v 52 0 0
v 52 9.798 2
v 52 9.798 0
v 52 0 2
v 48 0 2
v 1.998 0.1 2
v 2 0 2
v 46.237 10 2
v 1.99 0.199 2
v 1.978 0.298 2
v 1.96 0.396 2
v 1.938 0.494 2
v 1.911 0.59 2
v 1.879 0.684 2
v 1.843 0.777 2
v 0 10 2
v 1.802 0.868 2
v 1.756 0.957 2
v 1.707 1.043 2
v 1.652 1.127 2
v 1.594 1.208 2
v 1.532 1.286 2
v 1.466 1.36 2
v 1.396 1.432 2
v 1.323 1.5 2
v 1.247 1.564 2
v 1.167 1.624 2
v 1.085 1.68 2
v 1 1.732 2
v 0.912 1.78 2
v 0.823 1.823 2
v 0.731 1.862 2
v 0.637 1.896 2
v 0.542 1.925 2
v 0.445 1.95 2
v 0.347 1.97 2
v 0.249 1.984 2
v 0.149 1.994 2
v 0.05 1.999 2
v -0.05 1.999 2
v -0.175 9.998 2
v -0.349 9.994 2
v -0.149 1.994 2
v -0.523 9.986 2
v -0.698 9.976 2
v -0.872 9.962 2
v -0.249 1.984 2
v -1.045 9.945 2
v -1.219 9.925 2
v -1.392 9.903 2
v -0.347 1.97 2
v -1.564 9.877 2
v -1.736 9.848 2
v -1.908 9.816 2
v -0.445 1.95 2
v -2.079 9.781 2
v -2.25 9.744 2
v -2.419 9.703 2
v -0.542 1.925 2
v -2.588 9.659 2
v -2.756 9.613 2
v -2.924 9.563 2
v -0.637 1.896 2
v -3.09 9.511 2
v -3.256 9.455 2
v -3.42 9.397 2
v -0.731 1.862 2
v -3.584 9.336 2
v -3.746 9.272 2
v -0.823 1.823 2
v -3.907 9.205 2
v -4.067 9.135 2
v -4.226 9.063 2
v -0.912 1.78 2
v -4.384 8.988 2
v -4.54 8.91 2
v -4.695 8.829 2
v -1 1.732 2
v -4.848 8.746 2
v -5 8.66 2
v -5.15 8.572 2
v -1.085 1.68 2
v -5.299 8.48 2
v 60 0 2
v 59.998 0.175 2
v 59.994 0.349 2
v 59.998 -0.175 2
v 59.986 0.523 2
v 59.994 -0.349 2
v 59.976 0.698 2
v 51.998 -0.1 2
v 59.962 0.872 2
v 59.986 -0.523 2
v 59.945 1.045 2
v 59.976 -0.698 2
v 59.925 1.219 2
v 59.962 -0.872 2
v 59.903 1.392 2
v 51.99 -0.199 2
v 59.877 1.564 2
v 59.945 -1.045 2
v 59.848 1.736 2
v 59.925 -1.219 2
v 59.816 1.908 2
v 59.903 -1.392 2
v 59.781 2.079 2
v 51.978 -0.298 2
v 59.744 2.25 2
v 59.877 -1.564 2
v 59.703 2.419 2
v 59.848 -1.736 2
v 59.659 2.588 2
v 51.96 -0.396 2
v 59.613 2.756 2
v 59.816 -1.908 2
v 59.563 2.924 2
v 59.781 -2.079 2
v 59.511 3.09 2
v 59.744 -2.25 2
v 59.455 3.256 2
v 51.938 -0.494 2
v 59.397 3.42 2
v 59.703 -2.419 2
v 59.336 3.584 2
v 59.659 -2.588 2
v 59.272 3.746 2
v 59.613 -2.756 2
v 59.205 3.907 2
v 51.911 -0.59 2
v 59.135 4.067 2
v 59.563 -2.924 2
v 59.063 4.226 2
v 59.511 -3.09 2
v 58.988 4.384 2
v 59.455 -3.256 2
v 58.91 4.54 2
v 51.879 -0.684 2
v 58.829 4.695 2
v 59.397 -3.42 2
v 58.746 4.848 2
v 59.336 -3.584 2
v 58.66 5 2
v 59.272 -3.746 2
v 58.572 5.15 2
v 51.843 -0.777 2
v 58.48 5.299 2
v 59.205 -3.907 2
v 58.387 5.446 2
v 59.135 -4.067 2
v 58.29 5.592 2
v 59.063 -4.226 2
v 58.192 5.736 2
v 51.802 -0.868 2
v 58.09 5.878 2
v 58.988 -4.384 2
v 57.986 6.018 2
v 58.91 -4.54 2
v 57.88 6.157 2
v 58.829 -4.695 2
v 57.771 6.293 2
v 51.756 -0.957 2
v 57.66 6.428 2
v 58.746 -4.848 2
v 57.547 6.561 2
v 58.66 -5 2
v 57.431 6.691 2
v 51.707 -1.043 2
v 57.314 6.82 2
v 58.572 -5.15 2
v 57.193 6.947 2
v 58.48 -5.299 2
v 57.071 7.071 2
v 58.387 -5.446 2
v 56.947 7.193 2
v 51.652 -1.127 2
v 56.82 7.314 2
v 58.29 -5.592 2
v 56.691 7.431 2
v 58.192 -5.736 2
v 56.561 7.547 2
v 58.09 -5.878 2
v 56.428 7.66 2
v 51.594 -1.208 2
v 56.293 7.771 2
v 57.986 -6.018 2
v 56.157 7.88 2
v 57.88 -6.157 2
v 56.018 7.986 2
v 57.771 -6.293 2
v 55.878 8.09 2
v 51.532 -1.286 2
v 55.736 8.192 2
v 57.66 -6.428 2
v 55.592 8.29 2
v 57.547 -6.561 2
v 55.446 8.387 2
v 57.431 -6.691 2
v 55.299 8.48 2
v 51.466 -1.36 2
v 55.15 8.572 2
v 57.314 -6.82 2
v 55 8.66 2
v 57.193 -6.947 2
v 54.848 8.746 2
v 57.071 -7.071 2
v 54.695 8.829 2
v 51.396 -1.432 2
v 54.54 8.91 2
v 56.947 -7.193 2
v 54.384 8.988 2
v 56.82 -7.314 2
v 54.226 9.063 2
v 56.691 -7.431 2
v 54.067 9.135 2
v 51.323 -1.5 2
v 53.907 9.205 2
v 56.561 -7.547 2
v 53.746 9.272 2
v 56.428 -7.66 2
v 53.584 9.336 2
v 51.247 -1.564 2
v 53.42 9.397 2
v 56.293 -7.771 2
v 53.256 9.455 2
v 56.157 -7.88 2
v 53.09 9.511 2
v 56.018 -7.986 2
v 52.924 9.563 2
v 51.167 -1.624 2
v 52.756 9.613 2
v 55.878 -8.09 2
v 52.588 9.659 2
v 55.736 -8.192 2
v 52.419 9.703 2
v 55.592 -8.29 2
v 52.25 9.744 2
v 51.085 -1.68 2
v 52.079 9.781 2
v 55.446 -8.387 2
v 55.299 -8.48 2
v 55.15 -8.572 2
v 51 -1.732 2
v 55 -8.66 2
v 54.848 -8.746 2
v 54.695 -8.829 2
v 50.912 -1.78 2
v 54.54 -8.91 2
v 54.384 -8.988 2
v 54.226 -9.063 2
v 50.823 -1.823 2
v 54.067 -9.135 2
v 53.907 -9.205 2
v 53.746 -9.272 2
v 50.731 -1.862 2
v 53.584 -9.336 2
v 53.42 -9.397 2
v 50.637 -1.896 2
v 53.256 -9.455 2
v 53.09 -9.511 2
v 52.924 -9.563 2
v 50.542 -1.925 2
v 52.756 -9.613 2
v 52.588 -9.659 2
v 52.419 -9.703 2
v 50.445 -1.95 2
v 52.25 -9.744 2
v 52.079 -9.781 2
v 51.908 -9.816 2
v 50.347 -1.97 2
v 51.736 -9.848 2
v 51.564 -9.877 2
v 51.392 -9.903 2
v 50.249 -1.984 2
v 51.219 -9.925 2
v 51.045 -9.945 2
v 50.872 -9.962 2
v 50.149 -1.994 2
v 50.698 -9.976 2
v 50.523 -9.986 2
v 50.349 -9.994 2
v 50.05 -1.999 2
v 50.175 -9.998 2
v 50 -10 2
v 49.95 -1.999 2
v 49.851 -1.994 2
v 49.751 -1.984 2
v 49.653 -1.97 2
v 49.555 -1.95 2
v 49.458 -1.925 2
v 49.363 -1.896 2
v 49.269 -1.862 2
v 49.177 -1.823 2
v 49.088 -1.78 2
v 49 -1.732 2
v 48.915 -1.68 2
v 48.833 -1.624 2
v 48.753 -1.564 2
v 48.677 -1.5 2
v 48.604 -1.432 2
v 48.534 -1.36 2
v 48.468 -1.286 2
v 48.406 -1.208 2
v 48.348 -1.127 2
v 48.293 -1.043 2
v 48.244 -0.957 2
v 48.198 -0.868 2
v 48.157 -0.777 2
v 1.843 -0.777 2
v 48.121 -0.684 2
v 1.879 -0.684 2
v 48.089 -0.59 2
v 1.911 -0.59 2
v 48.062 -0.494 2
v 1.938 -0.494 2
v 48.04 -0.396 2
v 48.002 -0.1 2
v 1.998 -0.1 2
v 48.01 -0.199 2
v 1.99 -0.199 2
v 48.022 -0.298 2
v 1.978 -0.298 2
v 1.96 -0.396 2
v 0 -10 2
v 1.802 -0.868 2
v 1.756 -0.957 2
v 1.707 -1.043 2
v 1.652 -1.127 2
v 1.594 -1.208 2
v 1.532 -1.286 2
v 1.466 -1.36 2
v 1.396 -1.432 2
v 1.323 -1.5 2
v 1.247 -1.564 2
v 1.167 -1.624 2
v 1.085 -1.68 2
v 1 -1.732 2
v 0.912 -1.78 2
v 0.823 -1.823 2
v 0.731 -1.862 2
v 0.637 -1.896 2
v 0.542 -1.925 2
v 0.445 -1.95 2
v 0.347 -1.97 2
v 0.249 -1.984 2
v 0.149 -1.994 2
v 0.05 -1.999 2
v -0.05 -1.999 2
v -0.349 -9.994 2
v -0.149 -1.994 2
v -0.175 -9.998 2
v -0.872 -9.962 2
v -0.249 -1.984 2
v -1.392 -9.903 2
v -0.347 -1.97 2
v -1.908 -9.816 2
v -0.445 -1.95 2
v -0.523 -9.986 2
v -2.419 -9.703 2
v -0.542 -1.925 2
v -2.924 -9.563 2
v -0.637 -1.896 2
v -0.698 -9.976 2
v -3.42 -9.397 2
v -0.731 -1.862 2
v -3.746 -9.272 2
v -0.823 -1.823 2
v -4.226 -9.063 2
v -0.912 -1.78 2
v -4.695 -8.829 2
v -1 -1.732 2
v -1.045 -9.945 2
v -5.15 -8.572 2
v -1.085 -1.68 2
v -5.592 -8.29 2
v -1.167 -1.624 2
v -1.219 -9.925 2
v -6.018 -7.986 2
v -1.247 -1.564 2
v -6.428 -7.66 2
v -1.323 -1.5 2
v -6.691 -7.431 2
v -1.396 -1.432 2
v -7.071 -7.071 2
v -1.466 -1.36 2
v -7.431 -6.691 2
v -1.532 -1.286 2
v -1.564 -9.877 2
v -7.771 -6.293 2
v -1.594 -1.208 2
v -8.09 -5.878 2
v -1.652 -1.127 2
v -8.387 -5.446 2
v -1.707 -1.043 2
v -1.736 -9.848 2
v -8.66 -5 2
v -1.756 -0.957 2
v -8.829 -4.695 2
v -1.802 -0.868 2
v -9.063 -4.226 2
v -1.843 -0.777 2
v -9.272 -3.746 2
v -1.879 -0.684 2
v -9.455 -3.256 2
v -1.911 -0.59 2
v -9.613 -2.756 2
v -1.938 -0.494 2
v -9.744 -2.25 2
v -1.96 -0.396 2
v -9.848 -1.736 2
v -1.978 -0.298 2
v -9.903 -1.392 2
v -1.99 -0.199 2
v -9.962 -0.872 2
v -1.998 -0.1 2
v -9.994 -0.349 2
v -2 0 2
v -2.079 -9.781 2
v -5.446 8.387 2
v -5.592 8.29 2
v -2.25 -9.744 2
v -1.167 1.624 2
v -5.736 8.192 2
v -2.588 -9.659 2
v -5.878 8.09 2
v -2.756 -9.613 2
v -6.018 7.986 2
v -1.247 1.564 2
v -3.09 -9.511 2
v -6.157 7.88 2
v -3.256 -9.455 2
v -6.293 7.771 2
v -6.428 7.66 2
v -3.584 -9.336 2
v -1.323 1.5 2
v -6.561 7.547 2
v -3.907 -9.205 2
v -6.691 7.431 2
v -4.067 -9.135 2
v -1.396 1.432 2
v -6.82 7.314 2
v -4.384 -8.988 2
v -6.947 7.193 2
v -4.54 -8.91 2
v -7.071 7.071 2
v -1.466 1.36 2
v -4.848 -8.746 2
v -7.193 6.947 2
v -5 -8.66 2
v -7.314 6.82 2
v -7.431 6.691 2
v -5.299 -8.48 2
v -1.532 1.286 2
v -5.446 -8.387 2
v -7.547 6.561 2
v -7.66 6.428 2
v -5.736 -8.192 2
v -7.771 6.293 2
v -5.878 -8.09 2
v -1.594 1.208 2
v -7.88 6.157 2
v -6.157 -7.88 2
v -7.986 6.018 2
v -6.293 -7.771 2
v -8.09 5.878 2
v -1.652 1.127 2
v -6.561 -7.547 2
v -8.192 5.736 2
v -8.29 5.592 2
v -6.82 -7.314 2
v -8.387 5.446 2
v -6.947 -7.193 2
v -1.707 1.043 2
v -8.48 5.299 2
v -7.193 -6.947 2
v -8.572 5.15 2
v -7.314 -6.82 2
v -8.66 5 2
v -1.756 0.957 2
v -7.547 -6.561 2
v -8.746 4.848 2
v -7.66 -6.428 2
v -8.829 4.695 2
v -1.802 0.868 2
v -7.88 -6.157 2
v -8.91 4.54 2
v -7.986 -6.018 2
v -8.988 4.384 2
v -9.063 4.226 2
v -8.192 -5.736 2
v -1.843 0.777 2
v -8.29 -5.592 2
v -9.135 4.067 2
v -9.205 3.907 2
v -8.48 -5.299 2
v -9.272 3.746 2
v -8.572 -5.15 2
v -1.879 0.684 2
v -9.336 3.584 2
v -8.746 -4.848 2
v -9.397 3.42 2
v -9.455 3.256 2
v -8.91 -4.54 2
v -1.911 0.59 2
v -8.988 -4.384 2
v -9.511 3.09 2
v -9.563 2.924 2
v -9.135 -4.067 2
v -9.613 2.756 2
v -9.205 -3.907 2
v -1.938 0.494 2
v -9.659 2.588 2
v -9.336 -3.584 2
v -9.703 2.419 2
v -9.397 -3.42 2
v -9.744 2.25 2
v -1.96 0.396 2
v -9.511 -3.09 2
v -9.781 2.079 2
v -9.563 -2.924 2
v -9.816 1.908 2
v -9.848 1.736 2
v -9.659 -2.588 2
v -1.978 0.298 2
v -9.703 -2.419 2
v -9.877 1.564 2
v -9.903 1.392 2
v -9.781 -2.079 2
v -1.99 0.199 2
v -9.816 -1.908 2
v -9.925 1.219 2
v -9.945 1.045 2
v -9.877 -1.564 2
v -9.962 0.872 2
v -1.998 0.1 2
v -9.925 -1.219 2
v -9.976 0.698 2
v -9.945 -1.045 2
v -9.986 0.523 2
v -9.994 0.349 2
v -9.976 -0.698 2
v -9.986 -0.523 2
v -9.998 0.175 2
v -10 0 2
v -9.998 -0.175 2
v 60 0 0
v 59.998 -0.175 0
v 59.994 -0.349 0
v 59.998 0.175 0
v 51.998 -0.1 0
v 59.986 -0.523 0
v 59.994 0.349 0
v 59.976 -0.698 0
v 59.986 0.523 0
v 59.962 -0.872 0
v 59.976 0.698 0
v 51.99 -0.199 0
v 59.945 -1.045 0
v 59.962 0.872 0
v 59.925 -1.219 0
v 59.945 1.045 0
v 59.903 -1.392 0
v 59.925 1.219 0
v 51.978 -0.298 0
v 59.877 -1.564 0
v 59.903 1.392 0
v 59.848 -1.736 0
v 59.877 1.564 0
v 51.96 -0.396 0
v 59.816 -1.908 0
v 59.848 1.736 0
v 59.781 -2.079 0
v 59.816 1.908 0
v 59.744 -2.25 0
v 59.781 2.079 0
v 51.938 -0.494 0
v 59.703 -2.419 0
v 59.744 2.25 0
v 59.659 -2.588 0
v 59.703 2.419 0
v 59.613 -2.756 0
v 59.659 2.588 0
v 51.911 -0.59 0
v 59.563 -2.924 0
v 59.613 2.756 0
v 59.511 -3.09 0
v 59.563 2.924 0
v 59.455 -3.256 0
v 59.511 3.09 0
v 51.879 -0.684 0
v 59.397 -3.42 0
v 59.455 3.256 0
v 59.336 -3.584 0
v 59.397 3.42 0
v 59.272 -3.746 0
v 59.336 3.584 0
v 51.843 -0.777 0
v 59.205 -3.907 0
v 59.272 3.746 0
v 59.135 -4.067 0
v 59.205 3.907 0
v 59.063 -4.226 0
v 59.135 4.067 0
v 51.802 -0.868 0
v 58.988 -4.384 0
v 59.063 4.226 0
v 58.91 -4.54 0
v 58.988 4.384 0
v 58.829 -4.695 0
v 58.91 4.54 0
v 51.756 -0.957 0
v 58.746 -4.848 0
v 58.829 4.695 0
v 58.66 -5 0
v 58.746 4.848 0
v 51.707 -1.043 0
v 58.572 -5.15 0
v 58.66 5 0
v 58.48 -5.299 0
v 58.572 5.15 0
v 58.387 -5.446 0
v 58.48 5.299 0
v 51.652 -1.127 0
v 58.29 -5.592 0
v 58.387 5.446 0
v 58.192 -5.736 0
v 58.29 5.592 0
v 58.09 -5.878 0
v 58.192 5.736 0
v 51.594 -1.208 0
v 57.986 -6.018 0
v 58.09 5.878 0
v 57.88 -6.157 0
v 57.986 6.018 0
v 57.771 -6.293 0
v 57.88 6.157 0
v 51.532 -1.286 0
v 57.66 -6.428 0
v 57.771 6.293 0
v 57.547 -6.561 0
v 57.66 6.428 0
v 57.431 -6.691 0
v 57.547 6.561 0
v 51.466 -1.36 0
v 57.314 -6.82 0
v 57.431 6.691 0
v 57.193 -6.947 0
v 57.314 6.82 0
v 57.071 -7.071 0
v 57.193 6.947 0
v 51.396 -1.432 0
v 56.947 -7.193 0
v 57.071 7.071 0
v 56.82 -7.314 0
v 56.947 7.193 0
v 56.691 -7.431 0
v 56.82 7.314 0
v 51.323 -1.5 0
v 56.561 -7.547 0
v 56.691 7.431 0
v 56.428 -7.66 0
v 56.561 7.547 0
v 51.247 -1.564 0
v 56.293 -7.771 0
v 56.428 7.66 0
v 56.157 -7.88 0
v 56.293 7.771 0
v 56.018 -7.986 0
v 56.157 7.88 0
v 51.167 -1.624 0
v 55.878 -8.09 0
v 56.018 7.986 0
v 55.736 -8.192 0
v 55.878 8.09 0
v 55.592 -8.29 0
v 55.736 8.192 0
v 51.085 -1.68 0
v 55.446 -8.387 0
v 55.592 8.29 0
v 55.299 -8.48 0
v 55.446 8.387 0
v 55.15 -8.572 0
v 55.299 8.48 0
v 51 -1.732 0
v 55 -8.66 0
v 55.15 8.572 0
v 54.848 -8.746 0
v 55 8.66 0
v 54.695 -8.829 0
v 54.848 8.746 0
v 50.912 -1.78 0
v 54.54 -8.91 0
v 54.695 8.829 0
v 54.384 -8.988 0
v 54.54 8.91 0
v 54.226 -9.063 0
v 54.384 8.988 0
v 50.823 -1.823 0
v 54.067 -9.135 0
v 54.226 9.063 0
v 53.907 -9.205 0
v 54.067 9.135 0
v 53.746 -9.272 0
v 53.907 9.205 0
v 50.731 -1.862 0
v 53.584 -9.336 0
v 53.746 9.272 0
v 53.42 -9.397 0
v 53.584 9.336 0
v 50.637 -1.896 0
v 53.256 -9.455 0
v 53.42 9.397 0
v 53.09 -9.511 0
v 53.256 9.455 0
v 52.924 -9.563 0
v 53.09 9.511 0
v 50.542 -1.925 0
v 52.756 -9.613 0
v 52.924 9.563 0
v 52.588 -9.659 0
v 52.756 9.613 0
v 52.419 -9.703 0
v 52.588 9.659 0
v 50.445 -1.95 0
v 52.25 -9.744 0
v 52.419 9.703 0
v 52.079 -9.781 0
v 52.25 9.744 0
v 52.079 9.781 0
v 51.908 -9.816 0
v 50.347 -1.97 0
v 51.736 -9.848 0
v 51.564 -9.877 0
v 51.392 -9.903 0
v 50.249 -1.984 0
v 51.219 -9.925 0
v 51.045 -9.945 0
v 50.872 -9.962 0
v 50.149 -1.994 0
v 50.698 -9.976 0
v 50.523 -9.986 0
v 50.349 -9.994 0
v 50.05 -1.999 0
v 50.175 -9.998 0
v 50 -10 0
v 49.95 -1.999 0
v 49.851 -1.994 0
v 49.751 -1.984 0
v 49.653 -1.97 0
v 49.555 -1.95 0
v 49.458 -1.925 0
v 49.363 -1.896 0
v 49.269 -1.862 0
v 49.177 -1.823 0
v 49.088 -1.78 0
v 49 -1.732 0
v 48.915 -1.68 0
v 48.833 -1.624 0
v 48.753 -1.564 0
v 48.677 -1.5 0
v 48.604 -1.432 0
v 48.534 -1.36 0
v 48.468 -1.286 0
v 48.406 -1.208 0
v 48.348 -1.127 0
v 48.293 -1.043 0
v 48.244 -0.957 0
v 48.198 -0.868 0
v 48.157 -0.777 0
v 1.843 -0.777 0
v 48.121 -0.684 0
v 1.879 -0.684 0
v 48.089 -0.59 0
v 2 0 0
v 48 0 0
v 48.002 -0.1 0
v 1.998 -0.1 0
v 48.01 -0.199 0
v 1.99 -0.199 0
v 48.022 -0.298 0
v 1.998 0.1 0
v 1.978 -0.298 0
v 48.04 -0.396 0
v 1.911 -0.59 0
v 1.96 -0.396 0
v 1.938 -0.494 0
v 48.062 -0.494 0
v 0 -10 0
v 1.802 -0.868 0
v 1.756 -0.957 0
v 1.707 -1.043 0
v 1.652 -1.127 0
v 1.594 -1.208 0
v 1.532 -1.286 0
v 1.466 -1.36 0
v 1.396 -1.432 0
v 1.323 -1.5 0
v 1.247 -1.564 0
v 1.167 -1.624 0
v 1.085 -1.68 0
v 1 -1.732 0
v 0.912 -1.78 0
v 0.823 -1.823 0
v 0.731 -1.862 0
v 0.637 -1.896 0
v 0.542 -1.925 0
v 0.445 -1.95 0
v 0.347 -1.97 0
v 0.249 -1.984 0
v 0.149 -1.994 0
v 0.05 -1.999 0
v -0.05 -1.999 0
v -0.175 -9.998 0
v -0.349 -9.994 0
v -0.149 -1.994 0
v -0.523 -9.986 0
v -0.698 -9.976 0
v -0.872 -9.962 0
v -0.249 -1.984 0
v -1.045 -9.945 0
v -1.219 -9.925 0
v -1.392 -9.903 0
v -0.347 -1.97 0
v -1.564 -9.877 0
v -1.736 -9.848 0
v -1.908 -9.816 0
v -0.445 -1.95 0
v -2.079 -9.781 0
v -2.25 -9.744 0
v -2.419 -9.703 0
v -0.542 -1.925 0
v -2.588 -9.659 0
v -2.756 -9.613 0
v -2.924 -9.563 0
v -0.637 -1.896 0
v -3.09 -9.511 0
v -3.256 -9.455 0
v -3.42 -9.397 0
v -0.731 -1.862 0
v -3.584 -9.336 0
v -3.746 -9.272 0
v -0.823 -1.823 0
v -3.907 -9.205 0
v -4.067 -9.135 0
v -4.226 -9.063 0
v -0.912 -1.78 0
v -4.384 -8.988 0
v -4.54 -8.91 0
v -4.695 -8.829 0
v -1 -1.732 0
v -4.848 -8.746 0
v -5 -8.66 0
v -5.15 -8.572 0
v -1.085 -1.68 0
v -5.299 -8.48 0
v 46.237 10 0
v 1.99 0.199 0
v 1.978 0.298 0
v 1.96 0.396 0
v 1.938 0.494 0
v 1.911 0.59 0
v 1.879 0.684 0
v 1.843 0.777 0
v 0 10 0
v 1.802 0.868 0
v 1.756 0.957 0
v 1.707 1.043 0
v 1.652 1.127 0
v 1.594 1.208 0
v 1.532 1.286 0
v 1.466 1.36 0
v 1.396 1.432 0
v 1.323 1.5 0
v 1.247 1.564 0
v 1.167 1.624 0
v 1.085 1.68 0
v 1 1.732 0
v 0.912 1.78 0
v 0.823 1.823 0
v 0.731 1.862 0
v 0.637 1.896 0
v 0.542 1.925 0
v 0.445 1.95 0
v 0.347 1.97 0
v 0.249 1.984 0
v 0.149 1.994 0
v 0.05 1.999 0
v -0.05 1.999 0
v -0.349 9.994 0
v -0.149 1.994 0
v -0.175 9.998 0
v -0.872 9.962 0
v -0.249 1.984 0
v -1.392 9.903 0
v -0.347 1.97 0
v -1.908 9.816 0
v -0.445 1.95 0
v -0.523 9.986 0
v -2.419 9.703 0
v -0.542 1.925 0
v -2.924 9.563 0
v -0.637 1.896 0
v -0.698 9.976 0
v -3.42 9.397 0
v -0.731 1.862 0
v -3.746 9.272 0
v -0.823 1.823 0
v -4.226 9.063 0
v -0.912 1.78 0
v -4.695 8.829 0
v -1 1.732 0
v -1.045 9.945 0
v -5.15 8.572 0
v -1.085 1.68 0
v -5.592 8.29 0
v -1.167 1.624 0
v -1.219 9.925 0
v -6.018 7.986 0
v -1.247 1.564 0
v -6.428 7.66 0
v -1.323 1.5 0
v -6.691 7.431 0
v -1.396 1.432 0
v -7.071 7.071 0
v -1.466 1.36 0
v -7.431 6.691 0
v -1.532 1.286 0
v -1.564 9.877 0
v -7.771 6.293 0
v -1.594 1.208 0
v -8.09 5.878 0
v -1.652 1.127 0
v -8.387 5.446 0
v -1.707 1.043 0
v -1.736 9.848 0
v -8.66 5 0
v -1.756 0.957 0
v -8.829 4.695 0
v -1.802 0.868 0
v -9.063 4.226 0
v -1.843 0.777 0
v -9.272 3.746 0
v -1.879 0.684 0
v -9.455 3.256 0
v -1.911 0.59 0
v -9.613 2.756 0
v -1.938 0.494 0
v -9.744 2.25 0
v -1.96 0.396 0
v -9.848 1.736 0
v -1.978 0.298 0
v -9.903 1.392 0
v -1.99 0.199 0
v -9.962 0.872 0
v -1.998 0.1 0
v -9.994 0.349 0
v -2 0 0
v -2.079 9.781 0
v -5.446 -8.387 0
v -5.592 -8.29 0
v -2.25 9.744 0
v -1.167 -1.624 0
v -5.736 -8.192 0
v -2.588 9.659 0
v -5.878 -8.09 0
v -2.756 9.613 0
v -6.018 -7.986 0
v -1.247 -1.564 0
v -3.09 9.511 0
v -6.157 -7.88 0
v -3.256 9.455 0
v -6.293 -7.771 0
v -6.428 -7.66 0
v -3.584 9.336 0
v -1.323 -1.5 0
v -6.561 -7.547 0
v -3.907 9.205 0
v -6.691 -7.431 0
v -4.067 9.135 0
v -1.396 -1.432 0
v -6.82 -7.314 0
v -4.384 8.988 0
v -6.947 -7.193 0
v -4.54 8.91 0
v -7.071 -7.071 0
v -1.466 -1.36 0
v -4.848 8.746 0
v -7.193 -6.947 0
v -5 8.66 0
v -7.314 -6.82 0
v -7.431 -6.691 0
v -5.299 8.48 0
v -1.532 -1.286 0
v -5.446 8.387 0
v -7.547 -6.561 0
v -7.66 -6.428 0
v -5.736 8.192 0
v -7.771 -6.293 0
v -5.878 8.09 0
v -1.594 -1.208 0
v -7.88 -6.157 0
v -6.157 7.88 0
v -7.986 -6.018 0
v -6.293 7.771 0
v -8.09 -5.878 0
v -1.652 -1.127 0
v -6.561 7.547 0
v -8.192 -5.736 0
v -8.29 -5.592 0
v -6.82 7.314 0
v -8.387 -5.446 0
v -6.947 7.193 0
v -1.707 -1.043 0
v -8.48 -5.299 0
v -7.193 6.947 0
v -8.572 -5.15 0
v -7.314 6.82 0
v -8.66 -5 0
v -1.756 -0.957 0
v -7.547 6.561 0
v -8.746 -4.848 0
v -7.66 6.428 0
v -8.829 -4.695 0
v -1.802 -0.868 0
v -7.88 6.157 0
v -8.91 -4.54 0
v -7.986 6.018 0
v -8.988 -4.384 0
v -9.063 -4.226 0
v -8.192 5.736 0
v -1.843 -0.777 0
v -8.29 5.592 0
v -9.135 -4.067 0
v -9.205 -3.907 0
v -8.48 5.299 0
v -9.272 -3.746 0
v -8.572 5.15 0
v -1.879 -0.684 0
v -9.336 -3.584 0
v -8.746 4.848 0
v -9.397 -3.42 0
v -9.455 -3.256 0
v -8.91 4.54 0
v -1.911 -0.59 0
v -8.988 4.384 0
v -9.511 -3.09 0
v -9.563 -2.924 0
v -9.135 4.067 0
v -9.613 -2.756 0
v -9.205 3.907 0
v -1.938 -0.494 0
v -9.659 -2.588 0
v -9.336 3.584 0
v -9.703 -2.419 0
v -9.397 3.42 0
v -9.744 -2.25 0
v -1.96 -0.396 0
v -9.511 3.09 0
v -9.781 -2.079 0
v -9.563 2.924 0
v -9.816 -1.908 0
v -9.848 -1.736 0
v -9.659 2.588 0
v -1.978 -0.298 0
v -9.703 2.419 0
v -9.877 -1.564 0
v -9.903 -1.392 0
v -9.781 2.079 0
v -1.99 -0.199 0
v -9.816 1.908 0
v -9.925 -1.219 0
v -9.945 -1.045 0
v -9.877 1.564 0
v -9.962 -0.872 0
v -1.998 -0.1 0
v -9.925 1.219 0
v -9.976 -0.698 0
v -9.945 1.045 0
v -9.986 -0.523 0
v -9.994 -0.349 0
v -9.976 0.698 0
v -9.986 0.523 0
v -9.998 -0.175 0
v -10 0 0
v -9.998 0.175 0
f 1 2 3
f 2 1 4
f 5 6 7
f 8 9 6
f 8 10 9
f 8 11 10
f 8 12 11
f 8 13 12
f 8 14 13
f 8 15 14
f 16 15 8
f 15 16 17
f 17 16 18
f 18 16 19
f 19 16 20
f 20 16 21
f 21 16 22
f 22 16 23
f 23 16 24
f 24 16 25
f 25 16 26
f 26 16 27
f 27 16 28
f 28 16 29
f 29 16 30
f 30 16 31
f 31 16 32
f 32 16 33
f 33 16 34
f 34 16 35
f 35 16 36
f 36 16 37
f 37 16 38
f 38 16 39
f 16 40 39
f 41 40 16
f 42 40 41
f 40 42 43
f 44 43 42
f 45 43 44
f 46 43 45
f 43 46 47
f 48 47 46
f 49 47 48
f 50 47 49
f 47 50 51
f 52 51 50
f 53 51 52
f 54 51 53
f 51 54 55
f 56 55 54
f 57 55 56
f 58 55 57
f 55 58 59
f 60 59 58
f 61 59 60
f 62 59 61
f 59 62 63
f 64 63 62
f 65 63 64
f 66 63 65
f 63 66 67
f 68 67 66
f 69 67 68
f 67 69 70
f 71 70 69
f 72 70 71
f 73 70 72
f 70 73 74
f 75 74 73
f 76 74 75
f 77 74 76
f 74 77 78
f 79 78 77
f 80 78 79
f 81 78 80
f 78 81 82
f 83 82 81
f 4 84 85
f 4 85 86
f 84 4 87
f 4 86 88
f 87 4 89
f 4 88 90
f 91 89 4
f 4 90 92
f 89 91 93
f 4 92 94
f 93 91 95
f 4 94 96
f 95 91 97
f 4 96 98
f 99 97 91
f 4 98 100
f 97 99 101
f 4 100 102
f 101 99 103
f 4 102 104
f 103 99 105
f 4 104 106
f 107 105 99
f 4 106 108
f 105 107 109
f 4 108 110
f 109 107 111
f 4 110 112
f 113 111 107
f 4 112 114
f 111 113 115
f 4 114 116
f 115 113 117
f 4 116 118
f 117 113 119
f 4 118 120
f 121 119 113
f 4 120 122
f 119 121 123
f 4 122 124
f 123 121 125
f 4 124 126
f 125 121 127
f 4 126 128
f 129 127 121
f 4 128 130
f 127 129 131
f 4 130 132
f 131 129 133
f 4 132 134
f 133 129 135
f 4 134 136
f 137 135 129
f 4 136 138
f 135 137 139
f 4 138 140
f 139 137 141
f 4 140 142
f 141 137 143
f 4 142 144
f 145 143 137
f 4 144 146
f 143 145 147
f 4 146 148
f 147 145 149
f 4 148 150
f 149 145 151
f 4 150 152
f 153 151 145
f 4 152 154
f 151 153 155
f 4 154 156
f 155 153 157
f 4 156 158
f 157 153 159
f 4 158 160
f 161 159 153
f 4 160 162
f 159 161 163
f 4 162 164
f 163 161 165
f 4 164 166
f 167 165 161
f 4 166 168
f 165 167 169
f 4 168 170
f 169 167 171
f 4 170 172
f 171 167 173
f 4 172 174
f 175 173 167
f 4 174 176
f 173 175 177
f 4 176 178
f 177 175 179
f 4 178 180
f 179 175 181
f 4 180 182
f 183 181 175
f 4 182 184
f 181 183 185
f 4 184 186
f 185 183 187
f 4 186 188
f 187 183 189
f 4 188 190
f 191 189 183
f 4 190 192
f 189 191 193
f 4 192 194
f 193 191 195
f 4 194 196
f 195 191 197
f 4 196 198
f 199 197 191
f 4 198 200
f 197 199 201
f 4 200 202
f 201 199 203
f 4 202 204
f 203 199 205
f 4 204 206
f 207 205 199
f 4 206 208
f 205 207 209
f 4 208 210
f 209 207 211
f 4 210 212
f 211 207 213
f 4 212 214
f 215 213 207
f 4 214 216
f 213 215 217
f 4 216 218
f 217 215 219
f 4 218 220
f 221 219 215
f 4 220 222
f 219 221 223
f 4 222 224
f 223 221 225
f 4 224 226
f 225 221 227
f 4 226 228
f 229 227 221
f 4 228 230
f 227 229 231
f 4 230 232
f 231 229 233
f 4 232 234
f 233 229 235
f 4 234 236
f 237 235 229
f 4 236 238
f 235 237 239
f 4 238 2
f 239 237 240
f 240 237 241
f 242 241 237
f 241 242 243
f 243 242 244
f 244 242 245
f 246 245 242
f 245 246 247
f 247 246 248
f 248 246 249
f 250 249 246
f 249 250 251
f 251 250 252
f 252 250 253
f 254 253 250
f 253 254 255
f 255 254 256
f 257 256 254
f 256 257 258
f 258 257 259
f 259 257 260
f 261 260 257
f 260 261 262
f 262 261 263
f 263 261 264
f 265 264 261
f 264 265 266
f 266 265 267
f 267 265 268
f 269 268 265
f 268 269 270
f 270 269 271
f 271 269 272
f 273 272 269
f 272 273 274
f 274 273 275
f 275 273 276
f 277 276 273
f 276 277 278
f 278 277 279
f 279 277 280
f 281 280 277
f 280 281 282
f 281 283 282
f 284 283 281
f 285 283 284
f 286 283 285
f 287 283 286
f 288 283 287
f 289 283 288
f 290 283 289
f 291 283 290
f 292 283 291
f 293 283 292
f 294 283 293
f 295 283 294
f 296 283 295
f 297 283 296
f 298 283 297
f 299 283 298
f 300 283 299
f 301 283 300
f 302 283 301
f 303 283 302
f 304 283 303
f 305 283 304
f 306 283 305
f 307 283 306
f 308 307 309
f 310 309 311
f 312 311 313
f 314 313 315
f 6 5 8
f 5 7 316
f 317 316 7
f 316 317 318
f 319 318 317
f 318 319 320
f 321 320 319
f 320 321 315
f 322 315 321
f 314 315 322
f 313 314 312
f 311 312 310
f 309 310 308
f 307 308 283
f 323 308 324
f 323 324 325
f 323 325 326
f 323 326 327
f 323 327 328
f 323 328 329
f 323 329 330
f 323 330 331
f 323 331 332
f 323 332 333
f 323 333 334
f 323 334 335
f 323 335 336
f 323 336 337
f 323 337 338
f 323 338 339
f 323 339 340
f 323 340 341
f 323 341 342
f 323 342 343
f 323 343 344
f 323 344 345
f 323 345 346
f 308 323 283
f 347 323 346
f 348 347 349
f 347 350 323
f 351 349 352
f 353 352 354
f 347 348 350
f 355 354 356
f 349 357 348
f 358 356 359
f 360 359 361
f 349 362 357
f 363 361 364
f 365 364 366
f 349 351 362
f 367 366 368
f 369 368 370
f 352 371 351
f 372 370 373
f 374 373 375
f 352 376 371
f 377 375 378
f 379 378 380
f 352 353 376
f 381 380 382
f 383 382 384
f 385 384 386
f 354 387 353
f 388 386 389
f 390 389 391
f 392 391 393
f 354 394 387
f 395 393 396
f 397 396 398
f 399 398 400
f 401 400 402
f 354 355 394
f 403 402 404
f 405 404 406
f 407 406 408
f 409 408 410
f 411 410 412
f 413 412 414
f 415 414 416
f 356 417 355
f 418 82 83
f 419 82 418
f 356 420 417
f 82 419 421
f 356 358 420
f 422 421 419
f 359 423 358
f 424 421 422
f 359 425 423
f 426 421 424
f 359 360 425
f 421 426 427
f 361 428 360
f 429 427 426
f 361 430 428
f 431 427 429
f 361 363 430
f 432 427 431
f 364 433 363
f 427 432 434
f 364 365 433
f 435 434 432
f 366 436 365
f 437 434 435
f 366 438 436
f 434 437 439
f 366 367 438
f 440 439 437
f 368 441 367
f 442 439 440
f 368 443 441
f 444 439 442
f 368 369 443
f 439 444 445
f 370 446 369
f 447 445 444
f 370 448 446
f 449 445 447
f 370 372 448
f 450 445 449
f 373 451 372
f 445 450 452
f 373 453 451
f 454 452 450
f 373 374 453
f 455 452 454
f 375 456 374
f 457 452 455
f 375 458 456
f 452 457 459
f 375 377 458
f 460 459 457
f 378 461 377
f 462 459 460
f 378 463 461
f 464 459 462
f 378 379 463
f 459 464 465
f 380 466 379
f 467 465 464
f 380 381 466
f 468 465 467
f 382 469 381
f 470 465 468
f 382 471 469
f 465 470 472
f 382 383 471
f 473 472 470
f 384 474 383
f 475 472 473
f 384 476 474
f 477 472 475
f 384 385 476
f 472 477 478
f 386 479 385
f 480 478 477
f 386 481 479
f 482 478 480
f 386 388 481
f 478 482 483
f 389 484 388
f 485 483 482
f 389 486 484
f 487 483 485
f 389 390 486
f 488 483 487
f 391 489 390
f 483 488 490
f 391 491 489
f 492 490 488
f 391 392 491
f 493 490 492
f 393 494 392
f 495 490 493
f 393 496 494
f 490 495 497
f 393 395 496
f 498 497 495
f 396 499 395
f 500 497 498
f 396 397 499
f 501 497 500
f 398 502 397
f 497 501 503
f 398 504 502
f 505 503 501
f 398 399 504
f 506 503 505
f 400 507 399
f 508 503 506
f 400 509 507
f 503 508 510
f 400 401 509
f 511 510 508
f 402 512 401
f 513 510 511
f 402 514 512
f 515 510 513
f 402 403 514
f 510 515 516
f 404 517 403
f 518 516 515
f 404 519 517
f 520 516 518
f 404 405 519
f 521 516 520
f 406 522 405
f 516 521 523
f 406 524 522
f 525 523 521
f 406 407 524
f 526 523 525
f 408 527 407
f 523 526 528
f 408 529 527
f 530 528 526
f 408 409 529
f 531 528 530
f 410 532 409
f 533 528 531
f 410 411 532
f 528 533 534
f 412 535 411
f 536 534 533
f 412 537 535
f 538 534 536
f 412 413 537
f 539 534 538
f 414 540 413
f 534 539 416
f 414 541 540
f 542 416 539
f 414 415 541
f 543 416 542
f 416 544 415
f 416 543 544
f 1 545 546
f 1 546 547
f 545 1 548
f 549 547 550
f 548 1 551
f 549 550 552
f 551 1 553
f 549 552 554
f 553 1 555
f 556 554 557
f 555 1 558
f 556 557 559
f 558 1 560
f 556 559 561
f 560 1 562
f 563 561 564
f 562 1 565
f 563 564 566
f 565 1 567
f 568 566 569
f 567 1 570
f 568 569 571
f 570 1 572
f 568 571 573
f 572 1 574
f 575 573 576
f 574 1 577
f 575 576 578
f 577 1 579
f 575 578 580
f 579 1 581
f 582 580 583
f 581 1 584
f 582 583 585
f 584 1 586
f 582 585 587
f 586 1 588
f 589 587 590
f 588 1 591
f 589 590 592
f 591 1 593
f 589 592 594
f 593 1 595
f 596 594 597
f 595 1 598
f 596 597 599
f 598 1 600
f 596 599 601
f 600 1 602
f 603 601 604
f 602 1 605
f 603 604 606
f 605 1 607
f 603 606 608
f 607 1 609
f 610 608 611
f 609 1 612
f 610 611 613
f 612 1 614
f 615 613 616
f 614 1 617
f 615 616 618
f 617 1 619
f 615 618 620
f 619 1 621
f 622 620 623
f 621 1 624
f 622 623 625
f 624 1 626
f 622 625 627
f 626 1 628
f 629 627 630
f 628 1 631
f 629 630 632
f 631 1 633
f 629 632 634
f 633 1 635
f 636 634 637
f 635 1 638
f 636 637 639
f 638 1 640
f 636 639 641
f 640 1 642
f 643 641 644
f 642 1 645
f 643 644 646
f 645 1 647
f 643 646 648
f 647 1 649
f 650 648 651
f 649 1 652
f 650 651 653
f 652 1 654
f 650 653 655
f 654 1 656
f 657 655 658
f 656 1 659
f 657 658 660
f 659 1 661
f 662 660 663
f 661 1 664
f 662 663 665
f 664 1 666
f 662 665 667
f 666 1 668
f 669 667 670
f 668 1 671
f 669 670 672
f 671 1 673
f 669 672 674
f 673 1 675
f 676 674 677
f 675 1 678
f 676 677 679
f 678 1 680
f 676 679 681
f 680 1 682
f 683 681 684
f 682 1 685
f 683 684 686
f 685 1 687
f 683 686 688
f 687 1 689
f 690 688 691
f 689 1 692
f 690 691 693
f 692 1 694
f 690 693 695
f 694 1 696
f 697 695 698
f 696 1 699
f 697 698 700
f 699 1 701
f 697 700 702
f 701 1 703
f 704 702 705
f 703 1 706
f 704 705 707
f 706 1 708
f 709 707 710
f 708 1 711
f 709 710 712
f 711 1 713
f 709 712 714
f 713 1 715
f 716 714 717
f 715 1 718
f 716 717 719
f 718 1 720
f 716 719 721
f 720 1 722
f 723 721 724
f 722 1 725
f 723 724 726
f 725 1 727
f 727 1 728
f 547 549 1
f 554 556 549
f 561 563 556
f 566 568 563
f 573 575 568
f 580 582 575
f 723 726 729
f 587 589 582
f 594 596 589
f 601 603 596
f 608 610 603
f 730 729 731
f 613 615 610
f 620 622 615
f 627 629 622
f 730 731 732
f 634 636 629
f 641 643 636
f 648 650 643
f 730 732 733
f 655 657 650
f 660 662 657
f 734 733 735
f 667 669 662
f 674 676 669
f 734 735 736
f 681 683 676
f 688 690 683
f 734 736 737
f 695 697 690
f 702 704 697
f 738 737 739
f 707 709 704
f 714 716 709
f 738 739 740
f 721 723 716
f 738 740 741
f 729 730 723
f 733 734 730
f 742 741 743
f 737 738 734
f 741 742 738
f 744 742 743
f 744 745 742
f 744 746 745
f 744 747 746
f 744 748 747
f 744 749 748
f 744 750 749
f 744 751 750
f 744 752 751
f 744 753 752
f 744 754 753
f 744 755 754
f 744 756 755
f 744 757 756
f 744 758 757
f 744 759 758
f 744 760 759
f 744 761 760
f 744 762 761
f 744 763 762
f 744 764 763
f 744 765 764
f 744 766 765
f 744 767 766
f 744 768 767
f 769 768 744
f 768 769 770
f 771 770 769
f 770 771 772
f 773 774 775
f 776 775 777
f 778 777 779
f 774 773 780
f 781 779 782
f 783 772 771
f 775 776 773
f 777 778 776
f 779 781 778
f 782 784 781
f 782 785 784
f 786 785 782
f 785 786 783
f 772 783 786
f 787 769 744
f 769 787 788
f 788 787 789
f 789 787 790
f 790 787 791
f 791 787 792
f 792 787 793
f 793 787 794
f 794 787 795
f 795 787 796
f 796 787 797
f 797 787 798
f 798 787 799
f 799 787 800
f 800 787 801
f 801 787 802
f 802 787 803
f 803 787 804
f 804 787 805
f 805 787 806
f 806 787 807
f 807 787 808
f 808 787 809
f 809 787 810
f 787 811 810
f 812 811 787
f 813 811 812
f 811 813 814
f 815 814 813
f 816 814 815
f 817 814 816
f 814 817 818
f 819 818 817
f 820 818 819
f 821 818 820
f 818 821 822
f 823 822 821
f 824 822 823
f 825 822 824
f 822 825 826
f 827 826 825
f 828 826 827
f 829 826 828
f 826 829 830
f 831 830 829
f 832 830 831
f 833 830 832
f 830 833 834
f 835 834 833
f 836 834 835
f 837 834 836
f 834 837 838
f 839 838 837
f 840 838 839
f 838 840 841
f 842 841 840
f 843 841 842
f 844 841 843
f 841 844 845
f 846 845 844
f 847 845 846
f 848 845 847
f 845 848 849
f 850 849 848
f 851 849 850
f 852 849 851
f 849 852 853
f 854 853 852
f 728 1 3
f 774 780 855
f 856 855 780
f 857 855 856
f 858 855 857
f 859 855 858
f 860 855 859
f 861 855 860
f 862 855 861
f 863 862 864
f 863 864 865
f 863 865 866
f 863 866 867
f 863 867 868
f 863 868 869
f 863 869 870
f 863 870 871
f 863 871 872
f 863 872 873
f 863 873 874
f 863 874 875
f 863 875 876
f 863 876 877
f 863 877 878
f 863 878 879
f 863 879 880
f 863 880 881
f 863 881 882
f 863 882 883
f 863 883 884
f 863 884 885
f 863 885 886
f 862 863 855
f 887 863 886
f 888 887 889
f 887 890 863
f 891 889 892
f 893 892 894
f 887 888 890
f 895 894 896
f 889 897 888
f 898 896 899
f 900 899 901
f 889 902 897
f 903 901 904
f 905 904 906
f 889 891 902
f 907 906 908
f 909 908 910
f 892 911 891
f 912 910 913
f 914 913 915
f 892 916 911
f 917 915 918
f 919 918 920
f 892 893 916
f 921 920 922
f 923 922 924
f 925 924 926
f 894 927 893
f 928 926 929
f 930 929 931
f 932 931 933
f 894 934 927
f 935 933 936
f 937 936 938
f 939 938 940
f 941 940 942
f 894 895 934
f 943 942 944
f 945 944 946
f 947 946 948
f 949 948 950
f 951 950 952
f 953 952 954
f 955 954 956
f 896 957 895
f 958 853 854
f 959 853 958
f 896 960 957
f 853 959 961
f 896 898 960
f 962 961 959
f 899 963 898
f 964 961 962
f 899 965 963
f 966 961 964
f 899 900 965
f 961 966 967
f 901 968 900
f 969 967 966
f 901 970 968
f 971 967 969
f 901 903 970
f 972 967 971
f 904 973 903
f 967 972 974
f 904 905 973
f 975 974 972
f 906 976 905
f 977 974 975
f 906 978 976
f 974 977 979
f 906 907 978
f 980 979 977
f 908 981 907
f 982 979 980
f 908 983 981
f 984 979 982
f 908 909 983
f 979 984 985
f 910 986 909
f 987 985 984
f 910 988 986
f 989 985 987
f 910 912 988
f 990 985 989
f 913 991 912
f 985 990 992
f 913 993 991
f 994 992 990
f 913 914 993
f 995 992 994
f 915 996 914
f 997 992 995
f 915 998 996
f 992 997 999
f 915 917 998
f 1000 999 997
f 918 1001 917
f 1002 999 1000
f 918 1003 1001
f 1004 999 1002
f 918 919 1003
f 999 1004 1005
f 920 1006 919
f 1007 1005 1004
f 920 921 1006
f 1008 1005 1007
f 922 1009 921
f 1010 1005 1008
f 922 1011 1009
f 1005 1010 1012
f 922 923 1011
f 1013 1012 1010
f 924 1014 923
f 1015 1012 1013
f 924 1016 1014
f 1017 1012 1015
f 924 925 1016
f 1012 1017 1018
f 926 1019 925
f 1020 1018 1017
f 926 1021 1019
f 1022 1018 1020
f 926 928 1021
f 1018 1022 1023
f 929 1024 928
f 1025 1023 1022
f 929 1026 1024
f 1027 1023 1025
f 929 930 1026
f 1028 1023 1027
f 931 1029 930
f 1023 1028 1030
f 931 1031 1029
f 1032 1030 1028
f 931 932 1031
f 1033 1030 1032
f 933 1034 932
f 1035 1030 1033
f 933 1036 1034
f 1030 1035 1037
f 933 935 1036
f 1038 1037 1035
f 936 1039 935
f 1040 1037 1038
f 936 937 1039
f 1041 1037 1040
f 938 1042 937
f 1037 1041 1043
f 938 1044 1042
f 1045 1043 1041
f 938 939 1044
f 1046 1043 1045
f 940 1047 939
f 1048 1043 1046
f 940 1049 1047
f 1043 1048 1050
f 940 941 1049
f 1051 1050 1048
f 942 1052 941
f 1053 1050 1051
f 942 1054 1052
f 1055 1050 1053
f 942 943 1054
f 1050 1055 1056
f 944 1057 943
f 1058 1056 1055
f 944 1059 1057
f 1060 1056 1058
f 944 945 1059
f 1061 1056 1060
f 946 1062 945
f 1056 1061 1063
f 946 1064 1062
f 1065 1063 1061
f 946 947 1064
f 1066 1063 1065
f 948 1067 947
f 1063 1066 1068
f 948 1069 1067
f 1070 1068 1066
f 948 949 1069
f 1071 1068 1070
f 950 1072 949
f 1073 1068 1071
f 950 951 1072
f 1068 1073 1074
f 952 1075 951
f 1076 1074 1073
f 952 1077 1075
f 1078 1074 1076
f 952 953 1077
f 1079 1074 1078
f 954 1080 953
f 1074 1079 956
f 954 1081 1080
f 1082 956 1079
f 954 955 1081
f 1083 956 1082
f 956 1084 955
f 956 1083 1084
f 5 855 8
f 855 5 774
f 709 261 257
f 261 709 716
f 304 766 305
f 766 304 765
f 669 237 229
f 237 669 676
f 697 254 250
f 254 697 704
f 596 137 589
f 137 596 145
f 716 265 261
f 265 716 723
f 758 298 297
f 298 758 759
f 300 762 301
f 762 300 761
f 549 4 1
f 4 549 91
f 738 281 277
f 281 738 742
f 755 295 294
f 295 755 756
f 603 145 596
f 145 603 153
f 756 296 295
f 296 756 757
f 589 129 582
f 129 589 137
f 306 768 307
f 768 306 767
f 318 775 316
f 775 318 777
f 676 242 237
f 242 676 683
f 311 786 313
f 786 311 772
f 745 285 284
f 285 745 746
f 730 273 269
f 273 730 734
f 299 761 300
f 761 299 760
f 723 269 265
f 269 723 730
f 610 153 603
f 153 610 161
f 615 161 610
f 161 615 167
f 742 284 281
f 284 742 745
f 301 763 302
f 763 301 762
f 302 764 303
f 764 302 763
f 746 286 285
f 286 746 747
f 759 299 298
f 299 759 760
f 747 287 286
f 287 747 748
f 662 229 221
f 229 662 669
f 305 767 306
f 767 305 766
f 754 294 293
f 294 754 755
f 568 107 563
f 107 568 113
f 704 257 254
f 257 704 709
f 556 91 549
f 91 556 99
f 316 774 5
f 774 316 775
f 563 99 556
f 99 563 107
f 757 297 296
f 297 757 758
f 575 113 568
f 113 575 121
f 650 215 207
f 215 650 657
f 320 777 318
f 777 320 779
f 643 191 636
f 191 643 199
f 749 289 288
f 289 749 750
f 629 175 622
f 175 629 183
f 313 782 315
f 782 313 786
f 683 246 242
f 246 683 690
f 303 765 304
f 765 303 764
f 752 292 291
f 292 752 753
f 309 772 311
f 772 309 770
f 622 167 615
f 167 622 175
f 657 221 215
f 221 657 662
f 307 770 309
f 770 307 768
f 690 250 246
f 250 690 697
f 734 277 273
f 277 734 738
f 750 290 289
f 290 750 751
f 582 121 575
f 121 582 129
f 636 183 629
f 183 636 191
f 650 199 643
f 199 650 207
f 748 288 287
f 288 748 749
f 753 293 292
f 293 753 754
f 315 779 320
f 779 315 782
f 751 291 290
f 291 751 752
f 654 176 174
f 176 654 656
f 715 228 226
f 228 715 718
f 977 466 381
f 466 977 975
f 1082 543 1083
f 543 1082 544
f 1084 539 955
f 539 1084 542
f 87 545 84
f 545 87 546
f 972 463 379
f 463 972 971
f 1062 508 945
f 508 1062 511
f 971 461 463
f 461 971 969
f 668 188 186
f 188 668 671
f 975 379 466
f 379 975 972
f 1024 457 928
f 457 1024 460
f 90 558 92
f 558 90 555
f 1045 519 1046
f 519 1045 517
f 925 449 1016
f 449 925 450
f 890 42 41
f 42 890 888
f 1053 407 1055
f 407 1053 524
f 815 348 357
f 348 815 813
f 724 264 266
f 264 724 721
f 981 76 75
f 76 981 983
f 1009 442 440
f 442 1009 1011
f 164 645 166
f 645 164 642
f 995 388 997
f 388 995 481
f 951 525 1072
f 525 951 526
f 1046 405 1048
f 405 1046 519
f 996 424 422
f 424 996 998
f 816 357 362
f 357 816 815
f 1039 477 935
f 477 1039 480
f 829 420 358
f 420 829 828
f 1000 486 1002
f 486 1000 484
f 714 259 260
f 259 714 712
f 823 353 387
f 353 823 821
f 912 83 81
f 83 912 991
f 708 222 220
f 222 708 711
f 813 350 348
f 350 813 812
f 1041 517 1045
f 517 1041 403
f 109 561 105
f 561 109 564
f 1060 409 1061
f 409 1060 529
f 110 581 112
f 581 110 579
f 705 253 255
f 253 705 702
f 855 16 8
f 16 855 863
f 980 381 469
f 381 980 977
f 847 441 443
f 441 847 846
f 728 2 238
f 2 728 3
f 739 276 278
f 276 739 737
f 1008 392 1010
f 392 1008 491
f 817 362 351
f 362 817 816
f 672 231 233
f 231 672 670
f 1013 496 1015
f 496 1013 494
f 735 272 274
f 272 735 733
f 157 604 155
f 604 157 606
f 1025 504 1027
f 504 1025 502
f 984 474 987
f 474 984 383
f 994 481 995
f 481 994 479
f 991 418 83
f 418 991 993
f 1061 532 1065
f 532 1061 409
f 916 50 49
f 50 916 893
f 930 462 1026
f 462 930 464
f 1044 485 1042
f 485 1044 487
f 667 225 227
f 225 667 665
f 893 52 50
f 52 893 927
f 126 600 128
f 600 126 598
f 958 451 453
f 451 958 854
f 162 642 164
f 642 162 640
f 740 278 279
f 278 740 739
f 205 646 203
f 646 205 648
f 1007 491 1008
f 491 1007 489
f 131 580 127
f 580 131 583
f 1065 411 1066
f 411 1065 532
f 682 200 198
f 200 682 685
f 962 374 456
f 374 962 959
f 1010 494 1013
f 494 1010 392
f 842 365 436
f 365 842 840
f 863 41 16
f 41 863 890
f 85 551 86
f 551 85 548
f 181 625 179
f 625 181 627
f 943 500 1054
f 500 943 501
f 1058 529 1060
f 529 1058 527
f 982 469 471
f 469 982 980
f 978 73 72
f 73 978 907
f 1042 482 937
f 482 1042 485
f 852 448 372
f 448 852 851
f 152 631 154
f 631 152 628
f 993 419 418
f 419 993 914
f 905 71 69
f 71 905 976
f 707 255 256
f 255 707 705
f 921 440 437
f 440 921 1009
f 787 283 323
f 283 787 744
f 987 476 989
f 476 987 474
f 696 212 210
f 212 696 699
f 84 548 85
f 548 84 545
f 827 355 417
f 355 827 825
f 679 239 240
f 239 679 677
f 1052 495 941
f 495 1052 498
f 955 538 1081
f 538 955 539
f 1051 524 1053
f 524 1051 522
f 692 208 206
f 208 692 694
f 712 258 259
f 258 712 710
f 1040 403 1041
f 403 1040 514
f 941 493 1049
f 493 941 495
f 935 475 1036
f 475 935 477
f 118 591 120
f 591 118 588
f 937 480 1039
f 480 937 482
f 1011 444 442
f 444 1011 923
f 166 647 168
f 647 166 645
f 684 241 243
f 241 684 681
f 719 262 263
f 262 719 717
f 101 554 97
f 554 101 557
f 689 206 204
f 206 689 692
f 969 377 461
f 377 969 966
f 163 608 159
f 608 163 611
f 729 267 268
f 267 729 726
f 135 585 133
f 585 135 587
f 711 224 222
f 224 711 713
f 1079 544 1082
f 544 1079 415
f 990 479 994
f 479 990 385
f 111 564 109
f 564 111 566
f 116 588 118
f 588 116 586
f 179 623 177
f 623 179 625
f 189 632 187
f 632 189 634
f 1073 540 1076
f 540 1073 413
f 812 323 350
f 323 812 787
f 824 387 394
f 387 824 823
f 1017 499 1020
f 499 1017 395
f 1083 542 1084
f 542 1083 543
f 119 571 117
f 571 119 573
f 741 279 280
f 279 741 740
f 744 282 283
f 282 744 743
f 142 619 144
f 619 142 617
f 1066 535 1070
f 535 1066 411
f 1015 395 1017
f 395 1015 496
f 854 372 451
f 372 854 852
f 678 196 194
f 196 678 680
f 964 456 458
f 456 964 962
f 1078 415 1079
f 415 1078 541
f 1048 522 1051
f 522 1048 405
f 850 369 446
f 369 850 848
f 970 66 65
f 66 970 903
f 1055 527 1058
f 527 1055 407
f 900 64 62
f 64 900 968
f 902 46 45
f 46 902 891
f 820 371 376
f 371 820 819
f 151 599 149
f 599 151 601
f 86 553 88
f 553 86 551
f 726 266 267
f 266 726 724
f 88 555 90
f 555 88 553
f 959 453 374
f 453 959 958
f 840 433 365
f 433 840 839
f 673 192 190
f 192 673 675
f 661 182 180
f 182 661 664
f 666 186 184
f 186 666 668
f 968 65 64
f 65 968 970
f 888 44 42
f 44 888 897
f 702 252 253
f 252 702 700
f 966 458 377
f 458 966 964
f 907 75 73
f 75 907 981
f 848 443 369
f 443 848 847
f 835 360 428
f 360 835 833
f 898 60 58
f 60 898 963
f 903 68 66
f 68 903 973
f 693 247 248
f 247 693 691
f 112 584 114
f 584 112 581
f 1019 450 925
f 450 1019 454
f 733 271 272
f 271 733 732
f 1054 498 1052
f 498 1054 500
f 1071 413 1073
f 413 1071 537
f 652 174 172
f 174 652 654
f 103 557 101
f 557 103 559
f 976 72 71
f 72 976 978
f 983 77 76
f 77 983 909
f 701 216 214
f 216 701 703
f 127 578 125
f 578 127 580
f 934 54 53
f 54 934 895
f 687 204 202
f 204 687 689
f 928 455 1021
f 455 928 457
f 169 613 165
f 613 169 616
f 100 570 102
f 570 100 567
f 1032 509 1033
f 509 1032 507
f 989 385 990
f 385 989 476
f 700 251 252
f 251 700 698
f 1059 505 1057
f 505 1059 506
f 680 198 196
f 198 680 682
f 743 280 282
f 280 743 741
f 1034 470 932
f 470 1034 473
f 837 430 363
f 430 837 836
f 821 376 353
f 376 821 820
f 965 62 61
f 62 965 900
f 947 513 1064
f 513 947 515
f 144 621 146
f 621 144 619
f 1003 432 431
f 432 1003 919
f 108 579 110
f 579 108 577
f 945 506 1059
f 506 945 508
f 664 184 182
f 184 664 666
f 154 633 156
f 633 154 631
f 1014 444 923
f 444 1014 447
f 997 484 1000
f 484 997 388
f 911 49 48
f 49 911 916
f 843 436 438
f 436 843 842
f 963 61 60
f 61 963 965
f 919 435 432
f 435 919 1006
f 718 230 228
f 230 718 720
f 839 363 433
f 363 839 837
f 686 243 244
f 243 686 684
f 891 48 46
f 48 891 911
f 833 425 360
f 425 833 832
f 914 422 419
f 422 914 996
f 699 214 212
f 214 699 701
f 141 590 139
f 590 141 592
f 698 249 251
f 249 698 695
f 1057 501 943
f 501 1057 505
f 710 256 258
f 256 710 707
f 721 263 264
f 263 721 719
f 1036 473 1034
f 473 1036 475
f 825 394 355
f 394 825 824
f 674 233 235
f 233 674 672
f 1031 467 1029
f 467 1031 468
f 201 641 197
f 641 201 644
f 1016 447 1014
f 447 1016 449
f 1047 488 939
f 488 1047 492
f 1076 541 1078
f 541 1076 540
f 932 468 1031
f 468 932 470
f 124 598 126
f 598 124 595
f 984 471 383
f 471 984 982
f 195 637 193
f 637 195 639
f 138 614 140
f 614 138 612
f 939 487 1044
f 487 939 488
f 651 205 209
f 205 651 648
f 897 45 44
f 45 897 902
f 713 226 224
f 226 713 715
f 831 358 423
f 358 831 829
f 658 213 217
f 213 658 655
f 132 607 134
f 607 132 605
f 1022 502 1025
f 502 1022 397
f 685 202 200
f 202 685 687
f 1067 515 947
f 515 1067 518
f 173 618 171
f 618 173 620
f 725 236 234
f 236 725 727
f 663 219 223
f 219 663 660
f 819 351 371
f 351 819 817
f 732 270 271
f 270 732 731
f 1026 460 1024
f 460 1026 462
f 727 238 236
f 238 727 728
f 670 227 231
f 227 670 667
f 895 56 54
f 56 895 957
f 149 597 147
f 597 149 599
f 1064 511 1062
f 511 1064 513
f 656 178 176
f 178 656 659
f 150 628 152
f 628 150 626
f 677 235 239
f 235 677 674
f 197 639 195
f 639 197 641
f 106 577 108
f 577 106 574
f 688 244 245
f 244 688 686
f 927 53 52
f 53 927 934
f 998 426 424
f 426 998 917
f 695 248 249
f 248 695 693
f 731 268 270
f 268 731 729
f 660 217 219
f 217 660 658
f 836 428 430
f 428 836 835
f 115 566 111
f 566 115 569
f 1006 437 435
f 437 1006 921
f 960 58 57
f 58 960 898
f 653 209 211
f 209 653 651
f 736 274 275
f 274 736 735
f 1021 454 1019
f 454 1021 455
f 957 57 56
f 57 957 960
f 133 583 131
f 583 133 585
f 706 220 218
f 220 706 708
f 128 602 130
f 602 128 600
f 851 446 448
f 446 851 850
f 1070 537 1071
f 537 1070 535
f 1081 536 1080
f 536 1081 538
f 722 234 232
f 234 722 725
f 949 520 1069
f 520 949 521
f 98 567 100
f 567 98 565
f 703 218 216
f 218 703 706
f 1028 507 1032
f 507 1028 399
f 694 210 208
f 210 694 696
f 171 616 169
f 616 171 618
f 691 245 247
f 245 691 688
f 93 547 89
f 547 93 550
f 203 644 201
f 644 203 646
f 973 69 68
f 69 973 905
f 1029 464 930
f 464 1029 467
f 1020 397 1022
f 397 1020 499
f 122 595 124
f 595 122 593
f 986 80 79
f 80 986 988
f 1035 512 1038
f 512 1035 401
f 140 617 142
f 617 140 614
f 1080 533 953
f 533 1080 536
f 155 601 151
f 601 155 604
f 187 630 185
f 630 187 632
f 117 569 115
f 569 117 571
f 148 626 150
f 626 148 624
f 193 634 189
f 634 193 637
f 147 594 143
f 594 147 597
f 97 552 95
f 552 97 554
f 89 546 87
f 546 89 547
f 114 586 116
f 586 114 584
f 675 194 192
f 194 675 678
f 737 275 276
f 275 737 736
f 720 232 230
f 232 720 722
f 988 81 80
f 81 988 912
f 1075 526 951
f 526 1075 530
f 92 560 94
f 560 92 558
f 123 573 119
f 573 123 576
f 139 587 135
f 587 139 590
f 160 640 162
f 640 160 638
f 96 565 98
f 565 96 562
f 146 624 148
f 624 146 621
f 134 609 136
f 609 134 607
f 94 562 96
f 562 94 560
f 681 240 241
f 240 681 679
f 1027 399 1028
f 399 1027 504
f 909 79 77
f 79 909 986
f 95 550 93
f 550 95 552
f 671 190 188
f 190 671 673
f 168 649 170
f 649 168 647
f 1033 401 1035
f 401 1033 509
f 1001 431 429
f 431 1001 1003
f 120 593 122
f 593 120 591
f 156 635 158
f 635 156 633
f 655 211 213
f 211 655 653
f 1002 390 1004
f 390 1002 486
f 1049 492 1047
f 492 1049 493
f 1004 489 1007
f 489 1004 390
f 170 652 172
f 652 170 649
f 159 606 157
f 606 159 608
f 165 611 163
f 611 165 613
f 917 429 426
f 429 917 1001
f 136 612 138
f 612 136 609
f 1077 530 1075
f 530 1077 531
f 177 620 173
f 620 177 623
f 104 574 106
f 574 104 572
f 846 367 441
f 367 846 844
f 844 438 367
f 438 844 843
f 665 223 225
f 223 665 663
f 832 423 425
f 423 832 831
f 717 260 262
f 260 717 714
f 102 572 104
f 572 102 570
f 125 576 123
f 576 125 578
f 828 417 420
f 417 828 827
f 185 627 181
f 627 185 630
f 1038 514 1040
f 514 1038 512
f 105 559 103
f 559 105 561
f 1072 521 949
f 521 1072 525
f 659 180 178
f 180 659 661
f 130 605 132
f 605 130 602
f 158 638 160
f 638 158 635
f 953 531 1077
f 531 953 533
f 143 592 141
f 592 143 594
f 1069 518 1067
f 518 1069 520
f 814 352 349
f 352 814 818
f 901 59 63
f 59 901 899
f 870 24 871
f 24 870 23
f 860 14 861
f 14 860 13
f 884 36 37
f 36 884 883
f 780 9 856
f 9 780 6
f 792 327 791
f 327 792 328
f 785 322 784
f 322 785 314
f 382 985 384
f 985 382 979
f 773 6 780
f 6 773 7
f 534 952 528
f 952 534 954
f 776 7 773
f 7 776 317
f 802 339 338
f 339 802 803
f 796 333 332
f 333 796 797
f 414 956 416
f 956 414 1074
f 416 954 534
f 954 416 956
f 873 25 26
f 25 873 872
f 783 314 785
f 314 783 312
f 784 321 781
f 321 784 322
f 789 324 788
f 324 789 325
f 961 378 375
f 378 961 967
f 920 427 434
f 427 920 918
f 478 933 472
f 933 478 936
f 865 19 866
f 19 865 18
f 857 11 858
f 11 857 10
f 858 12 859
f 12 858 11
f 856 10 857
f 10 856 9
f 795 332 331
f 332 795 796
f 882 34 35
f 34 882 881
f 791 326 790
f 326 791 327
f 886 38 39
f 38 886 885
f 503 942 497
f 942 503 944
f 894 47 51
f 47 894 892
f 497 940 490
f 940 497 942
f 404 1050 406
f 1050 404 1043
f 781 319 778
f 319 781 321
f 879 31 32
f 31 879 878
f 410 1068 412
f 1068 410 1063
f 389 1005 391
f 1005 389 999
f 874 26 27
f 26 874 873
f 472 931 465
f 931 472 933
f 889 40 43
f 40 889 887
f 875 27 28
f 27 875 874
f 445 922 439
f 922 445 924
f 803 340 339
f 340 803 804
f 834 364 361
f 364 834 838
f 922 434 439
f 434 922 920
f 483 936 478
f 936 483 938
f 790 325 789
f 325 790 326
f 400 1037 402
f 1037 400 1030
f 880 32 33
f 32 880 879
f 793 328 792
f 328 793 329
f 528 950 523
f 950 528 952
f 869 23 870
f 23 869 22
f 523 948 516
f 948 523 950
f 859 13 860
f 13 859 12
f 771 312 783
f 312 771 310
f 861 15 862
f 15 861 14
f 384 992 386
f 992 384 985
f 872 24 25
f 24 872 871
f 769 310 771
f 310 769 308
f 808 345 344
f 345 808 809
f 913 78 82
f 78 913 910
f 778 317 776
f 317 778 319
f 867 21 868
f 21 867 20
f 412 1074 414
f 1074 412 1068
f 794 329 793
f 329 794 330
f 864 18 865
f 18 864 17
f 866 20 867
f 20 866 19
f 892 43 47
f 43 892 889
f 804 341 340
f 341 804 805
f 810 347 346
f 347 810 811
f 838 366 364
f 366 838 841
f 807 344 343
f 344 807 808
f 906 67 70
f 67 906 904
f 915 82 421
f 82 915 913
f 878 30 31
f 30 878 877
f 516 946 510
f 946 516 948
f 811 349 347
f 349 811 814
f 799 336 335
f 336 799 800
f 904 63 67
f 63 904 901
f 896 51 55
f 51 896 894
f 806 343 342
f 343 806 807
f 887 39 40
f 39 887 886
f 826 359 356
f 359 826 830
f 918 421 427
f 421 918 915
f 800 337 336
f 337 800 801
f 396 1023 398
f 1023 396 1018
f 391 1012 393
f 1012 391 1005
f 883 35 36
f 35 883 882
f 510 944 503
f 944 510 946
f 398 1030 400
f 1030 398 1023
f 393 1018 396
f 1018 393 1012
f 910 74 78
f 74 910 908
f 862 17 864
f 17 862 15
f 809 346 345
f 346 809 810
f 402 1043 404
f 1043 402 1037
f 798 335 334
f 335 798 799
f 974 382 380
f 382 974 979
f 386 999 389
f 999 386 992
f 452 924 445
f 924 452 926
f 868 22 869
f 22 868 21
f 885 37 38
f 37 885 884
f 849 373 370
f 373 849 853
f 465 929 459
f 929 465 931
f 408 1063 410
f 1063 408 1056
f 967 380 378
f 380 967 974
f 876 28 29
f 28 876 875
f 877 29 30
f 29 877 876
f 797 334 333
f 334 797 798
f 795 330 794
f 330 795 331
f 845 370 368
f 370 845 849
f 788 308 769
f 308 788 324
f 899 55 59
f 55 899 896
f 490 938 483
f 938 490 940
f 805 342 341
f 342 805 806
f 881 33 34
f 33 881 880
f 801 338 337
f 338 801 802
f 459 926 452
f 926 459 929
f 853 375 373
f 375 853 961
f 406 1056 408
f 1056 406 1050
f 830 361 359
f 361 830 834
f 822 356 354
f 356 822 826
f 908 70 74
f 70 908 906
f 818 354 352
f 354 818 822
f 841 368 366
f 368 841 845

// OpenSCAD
distance = 50;
screw_radius = 2;
radius = 10;
thickness = 2;
$fs=0.1;
$fa=1;

difference() {
	hull() {
		cylinder(r=radius, h=thickness);
		translate([distance, 0, 0]) {
			cylinder(r=radius, h=thickness);
		}
	}
	cylinder(r=screw_radius, h=thickness);
	translate([distance, 0, 0]) {
		cylinder(r=screw_radius, h=thickness);
		translate([-screw_radius, 0, 0]) {
			cube([screw_radius * 2, radius, thickness]);
			rotate([0, 0, 10]) {
				cube([screw_radius * 2, radius * 100, thickness]);
			}
		}
	}
}
